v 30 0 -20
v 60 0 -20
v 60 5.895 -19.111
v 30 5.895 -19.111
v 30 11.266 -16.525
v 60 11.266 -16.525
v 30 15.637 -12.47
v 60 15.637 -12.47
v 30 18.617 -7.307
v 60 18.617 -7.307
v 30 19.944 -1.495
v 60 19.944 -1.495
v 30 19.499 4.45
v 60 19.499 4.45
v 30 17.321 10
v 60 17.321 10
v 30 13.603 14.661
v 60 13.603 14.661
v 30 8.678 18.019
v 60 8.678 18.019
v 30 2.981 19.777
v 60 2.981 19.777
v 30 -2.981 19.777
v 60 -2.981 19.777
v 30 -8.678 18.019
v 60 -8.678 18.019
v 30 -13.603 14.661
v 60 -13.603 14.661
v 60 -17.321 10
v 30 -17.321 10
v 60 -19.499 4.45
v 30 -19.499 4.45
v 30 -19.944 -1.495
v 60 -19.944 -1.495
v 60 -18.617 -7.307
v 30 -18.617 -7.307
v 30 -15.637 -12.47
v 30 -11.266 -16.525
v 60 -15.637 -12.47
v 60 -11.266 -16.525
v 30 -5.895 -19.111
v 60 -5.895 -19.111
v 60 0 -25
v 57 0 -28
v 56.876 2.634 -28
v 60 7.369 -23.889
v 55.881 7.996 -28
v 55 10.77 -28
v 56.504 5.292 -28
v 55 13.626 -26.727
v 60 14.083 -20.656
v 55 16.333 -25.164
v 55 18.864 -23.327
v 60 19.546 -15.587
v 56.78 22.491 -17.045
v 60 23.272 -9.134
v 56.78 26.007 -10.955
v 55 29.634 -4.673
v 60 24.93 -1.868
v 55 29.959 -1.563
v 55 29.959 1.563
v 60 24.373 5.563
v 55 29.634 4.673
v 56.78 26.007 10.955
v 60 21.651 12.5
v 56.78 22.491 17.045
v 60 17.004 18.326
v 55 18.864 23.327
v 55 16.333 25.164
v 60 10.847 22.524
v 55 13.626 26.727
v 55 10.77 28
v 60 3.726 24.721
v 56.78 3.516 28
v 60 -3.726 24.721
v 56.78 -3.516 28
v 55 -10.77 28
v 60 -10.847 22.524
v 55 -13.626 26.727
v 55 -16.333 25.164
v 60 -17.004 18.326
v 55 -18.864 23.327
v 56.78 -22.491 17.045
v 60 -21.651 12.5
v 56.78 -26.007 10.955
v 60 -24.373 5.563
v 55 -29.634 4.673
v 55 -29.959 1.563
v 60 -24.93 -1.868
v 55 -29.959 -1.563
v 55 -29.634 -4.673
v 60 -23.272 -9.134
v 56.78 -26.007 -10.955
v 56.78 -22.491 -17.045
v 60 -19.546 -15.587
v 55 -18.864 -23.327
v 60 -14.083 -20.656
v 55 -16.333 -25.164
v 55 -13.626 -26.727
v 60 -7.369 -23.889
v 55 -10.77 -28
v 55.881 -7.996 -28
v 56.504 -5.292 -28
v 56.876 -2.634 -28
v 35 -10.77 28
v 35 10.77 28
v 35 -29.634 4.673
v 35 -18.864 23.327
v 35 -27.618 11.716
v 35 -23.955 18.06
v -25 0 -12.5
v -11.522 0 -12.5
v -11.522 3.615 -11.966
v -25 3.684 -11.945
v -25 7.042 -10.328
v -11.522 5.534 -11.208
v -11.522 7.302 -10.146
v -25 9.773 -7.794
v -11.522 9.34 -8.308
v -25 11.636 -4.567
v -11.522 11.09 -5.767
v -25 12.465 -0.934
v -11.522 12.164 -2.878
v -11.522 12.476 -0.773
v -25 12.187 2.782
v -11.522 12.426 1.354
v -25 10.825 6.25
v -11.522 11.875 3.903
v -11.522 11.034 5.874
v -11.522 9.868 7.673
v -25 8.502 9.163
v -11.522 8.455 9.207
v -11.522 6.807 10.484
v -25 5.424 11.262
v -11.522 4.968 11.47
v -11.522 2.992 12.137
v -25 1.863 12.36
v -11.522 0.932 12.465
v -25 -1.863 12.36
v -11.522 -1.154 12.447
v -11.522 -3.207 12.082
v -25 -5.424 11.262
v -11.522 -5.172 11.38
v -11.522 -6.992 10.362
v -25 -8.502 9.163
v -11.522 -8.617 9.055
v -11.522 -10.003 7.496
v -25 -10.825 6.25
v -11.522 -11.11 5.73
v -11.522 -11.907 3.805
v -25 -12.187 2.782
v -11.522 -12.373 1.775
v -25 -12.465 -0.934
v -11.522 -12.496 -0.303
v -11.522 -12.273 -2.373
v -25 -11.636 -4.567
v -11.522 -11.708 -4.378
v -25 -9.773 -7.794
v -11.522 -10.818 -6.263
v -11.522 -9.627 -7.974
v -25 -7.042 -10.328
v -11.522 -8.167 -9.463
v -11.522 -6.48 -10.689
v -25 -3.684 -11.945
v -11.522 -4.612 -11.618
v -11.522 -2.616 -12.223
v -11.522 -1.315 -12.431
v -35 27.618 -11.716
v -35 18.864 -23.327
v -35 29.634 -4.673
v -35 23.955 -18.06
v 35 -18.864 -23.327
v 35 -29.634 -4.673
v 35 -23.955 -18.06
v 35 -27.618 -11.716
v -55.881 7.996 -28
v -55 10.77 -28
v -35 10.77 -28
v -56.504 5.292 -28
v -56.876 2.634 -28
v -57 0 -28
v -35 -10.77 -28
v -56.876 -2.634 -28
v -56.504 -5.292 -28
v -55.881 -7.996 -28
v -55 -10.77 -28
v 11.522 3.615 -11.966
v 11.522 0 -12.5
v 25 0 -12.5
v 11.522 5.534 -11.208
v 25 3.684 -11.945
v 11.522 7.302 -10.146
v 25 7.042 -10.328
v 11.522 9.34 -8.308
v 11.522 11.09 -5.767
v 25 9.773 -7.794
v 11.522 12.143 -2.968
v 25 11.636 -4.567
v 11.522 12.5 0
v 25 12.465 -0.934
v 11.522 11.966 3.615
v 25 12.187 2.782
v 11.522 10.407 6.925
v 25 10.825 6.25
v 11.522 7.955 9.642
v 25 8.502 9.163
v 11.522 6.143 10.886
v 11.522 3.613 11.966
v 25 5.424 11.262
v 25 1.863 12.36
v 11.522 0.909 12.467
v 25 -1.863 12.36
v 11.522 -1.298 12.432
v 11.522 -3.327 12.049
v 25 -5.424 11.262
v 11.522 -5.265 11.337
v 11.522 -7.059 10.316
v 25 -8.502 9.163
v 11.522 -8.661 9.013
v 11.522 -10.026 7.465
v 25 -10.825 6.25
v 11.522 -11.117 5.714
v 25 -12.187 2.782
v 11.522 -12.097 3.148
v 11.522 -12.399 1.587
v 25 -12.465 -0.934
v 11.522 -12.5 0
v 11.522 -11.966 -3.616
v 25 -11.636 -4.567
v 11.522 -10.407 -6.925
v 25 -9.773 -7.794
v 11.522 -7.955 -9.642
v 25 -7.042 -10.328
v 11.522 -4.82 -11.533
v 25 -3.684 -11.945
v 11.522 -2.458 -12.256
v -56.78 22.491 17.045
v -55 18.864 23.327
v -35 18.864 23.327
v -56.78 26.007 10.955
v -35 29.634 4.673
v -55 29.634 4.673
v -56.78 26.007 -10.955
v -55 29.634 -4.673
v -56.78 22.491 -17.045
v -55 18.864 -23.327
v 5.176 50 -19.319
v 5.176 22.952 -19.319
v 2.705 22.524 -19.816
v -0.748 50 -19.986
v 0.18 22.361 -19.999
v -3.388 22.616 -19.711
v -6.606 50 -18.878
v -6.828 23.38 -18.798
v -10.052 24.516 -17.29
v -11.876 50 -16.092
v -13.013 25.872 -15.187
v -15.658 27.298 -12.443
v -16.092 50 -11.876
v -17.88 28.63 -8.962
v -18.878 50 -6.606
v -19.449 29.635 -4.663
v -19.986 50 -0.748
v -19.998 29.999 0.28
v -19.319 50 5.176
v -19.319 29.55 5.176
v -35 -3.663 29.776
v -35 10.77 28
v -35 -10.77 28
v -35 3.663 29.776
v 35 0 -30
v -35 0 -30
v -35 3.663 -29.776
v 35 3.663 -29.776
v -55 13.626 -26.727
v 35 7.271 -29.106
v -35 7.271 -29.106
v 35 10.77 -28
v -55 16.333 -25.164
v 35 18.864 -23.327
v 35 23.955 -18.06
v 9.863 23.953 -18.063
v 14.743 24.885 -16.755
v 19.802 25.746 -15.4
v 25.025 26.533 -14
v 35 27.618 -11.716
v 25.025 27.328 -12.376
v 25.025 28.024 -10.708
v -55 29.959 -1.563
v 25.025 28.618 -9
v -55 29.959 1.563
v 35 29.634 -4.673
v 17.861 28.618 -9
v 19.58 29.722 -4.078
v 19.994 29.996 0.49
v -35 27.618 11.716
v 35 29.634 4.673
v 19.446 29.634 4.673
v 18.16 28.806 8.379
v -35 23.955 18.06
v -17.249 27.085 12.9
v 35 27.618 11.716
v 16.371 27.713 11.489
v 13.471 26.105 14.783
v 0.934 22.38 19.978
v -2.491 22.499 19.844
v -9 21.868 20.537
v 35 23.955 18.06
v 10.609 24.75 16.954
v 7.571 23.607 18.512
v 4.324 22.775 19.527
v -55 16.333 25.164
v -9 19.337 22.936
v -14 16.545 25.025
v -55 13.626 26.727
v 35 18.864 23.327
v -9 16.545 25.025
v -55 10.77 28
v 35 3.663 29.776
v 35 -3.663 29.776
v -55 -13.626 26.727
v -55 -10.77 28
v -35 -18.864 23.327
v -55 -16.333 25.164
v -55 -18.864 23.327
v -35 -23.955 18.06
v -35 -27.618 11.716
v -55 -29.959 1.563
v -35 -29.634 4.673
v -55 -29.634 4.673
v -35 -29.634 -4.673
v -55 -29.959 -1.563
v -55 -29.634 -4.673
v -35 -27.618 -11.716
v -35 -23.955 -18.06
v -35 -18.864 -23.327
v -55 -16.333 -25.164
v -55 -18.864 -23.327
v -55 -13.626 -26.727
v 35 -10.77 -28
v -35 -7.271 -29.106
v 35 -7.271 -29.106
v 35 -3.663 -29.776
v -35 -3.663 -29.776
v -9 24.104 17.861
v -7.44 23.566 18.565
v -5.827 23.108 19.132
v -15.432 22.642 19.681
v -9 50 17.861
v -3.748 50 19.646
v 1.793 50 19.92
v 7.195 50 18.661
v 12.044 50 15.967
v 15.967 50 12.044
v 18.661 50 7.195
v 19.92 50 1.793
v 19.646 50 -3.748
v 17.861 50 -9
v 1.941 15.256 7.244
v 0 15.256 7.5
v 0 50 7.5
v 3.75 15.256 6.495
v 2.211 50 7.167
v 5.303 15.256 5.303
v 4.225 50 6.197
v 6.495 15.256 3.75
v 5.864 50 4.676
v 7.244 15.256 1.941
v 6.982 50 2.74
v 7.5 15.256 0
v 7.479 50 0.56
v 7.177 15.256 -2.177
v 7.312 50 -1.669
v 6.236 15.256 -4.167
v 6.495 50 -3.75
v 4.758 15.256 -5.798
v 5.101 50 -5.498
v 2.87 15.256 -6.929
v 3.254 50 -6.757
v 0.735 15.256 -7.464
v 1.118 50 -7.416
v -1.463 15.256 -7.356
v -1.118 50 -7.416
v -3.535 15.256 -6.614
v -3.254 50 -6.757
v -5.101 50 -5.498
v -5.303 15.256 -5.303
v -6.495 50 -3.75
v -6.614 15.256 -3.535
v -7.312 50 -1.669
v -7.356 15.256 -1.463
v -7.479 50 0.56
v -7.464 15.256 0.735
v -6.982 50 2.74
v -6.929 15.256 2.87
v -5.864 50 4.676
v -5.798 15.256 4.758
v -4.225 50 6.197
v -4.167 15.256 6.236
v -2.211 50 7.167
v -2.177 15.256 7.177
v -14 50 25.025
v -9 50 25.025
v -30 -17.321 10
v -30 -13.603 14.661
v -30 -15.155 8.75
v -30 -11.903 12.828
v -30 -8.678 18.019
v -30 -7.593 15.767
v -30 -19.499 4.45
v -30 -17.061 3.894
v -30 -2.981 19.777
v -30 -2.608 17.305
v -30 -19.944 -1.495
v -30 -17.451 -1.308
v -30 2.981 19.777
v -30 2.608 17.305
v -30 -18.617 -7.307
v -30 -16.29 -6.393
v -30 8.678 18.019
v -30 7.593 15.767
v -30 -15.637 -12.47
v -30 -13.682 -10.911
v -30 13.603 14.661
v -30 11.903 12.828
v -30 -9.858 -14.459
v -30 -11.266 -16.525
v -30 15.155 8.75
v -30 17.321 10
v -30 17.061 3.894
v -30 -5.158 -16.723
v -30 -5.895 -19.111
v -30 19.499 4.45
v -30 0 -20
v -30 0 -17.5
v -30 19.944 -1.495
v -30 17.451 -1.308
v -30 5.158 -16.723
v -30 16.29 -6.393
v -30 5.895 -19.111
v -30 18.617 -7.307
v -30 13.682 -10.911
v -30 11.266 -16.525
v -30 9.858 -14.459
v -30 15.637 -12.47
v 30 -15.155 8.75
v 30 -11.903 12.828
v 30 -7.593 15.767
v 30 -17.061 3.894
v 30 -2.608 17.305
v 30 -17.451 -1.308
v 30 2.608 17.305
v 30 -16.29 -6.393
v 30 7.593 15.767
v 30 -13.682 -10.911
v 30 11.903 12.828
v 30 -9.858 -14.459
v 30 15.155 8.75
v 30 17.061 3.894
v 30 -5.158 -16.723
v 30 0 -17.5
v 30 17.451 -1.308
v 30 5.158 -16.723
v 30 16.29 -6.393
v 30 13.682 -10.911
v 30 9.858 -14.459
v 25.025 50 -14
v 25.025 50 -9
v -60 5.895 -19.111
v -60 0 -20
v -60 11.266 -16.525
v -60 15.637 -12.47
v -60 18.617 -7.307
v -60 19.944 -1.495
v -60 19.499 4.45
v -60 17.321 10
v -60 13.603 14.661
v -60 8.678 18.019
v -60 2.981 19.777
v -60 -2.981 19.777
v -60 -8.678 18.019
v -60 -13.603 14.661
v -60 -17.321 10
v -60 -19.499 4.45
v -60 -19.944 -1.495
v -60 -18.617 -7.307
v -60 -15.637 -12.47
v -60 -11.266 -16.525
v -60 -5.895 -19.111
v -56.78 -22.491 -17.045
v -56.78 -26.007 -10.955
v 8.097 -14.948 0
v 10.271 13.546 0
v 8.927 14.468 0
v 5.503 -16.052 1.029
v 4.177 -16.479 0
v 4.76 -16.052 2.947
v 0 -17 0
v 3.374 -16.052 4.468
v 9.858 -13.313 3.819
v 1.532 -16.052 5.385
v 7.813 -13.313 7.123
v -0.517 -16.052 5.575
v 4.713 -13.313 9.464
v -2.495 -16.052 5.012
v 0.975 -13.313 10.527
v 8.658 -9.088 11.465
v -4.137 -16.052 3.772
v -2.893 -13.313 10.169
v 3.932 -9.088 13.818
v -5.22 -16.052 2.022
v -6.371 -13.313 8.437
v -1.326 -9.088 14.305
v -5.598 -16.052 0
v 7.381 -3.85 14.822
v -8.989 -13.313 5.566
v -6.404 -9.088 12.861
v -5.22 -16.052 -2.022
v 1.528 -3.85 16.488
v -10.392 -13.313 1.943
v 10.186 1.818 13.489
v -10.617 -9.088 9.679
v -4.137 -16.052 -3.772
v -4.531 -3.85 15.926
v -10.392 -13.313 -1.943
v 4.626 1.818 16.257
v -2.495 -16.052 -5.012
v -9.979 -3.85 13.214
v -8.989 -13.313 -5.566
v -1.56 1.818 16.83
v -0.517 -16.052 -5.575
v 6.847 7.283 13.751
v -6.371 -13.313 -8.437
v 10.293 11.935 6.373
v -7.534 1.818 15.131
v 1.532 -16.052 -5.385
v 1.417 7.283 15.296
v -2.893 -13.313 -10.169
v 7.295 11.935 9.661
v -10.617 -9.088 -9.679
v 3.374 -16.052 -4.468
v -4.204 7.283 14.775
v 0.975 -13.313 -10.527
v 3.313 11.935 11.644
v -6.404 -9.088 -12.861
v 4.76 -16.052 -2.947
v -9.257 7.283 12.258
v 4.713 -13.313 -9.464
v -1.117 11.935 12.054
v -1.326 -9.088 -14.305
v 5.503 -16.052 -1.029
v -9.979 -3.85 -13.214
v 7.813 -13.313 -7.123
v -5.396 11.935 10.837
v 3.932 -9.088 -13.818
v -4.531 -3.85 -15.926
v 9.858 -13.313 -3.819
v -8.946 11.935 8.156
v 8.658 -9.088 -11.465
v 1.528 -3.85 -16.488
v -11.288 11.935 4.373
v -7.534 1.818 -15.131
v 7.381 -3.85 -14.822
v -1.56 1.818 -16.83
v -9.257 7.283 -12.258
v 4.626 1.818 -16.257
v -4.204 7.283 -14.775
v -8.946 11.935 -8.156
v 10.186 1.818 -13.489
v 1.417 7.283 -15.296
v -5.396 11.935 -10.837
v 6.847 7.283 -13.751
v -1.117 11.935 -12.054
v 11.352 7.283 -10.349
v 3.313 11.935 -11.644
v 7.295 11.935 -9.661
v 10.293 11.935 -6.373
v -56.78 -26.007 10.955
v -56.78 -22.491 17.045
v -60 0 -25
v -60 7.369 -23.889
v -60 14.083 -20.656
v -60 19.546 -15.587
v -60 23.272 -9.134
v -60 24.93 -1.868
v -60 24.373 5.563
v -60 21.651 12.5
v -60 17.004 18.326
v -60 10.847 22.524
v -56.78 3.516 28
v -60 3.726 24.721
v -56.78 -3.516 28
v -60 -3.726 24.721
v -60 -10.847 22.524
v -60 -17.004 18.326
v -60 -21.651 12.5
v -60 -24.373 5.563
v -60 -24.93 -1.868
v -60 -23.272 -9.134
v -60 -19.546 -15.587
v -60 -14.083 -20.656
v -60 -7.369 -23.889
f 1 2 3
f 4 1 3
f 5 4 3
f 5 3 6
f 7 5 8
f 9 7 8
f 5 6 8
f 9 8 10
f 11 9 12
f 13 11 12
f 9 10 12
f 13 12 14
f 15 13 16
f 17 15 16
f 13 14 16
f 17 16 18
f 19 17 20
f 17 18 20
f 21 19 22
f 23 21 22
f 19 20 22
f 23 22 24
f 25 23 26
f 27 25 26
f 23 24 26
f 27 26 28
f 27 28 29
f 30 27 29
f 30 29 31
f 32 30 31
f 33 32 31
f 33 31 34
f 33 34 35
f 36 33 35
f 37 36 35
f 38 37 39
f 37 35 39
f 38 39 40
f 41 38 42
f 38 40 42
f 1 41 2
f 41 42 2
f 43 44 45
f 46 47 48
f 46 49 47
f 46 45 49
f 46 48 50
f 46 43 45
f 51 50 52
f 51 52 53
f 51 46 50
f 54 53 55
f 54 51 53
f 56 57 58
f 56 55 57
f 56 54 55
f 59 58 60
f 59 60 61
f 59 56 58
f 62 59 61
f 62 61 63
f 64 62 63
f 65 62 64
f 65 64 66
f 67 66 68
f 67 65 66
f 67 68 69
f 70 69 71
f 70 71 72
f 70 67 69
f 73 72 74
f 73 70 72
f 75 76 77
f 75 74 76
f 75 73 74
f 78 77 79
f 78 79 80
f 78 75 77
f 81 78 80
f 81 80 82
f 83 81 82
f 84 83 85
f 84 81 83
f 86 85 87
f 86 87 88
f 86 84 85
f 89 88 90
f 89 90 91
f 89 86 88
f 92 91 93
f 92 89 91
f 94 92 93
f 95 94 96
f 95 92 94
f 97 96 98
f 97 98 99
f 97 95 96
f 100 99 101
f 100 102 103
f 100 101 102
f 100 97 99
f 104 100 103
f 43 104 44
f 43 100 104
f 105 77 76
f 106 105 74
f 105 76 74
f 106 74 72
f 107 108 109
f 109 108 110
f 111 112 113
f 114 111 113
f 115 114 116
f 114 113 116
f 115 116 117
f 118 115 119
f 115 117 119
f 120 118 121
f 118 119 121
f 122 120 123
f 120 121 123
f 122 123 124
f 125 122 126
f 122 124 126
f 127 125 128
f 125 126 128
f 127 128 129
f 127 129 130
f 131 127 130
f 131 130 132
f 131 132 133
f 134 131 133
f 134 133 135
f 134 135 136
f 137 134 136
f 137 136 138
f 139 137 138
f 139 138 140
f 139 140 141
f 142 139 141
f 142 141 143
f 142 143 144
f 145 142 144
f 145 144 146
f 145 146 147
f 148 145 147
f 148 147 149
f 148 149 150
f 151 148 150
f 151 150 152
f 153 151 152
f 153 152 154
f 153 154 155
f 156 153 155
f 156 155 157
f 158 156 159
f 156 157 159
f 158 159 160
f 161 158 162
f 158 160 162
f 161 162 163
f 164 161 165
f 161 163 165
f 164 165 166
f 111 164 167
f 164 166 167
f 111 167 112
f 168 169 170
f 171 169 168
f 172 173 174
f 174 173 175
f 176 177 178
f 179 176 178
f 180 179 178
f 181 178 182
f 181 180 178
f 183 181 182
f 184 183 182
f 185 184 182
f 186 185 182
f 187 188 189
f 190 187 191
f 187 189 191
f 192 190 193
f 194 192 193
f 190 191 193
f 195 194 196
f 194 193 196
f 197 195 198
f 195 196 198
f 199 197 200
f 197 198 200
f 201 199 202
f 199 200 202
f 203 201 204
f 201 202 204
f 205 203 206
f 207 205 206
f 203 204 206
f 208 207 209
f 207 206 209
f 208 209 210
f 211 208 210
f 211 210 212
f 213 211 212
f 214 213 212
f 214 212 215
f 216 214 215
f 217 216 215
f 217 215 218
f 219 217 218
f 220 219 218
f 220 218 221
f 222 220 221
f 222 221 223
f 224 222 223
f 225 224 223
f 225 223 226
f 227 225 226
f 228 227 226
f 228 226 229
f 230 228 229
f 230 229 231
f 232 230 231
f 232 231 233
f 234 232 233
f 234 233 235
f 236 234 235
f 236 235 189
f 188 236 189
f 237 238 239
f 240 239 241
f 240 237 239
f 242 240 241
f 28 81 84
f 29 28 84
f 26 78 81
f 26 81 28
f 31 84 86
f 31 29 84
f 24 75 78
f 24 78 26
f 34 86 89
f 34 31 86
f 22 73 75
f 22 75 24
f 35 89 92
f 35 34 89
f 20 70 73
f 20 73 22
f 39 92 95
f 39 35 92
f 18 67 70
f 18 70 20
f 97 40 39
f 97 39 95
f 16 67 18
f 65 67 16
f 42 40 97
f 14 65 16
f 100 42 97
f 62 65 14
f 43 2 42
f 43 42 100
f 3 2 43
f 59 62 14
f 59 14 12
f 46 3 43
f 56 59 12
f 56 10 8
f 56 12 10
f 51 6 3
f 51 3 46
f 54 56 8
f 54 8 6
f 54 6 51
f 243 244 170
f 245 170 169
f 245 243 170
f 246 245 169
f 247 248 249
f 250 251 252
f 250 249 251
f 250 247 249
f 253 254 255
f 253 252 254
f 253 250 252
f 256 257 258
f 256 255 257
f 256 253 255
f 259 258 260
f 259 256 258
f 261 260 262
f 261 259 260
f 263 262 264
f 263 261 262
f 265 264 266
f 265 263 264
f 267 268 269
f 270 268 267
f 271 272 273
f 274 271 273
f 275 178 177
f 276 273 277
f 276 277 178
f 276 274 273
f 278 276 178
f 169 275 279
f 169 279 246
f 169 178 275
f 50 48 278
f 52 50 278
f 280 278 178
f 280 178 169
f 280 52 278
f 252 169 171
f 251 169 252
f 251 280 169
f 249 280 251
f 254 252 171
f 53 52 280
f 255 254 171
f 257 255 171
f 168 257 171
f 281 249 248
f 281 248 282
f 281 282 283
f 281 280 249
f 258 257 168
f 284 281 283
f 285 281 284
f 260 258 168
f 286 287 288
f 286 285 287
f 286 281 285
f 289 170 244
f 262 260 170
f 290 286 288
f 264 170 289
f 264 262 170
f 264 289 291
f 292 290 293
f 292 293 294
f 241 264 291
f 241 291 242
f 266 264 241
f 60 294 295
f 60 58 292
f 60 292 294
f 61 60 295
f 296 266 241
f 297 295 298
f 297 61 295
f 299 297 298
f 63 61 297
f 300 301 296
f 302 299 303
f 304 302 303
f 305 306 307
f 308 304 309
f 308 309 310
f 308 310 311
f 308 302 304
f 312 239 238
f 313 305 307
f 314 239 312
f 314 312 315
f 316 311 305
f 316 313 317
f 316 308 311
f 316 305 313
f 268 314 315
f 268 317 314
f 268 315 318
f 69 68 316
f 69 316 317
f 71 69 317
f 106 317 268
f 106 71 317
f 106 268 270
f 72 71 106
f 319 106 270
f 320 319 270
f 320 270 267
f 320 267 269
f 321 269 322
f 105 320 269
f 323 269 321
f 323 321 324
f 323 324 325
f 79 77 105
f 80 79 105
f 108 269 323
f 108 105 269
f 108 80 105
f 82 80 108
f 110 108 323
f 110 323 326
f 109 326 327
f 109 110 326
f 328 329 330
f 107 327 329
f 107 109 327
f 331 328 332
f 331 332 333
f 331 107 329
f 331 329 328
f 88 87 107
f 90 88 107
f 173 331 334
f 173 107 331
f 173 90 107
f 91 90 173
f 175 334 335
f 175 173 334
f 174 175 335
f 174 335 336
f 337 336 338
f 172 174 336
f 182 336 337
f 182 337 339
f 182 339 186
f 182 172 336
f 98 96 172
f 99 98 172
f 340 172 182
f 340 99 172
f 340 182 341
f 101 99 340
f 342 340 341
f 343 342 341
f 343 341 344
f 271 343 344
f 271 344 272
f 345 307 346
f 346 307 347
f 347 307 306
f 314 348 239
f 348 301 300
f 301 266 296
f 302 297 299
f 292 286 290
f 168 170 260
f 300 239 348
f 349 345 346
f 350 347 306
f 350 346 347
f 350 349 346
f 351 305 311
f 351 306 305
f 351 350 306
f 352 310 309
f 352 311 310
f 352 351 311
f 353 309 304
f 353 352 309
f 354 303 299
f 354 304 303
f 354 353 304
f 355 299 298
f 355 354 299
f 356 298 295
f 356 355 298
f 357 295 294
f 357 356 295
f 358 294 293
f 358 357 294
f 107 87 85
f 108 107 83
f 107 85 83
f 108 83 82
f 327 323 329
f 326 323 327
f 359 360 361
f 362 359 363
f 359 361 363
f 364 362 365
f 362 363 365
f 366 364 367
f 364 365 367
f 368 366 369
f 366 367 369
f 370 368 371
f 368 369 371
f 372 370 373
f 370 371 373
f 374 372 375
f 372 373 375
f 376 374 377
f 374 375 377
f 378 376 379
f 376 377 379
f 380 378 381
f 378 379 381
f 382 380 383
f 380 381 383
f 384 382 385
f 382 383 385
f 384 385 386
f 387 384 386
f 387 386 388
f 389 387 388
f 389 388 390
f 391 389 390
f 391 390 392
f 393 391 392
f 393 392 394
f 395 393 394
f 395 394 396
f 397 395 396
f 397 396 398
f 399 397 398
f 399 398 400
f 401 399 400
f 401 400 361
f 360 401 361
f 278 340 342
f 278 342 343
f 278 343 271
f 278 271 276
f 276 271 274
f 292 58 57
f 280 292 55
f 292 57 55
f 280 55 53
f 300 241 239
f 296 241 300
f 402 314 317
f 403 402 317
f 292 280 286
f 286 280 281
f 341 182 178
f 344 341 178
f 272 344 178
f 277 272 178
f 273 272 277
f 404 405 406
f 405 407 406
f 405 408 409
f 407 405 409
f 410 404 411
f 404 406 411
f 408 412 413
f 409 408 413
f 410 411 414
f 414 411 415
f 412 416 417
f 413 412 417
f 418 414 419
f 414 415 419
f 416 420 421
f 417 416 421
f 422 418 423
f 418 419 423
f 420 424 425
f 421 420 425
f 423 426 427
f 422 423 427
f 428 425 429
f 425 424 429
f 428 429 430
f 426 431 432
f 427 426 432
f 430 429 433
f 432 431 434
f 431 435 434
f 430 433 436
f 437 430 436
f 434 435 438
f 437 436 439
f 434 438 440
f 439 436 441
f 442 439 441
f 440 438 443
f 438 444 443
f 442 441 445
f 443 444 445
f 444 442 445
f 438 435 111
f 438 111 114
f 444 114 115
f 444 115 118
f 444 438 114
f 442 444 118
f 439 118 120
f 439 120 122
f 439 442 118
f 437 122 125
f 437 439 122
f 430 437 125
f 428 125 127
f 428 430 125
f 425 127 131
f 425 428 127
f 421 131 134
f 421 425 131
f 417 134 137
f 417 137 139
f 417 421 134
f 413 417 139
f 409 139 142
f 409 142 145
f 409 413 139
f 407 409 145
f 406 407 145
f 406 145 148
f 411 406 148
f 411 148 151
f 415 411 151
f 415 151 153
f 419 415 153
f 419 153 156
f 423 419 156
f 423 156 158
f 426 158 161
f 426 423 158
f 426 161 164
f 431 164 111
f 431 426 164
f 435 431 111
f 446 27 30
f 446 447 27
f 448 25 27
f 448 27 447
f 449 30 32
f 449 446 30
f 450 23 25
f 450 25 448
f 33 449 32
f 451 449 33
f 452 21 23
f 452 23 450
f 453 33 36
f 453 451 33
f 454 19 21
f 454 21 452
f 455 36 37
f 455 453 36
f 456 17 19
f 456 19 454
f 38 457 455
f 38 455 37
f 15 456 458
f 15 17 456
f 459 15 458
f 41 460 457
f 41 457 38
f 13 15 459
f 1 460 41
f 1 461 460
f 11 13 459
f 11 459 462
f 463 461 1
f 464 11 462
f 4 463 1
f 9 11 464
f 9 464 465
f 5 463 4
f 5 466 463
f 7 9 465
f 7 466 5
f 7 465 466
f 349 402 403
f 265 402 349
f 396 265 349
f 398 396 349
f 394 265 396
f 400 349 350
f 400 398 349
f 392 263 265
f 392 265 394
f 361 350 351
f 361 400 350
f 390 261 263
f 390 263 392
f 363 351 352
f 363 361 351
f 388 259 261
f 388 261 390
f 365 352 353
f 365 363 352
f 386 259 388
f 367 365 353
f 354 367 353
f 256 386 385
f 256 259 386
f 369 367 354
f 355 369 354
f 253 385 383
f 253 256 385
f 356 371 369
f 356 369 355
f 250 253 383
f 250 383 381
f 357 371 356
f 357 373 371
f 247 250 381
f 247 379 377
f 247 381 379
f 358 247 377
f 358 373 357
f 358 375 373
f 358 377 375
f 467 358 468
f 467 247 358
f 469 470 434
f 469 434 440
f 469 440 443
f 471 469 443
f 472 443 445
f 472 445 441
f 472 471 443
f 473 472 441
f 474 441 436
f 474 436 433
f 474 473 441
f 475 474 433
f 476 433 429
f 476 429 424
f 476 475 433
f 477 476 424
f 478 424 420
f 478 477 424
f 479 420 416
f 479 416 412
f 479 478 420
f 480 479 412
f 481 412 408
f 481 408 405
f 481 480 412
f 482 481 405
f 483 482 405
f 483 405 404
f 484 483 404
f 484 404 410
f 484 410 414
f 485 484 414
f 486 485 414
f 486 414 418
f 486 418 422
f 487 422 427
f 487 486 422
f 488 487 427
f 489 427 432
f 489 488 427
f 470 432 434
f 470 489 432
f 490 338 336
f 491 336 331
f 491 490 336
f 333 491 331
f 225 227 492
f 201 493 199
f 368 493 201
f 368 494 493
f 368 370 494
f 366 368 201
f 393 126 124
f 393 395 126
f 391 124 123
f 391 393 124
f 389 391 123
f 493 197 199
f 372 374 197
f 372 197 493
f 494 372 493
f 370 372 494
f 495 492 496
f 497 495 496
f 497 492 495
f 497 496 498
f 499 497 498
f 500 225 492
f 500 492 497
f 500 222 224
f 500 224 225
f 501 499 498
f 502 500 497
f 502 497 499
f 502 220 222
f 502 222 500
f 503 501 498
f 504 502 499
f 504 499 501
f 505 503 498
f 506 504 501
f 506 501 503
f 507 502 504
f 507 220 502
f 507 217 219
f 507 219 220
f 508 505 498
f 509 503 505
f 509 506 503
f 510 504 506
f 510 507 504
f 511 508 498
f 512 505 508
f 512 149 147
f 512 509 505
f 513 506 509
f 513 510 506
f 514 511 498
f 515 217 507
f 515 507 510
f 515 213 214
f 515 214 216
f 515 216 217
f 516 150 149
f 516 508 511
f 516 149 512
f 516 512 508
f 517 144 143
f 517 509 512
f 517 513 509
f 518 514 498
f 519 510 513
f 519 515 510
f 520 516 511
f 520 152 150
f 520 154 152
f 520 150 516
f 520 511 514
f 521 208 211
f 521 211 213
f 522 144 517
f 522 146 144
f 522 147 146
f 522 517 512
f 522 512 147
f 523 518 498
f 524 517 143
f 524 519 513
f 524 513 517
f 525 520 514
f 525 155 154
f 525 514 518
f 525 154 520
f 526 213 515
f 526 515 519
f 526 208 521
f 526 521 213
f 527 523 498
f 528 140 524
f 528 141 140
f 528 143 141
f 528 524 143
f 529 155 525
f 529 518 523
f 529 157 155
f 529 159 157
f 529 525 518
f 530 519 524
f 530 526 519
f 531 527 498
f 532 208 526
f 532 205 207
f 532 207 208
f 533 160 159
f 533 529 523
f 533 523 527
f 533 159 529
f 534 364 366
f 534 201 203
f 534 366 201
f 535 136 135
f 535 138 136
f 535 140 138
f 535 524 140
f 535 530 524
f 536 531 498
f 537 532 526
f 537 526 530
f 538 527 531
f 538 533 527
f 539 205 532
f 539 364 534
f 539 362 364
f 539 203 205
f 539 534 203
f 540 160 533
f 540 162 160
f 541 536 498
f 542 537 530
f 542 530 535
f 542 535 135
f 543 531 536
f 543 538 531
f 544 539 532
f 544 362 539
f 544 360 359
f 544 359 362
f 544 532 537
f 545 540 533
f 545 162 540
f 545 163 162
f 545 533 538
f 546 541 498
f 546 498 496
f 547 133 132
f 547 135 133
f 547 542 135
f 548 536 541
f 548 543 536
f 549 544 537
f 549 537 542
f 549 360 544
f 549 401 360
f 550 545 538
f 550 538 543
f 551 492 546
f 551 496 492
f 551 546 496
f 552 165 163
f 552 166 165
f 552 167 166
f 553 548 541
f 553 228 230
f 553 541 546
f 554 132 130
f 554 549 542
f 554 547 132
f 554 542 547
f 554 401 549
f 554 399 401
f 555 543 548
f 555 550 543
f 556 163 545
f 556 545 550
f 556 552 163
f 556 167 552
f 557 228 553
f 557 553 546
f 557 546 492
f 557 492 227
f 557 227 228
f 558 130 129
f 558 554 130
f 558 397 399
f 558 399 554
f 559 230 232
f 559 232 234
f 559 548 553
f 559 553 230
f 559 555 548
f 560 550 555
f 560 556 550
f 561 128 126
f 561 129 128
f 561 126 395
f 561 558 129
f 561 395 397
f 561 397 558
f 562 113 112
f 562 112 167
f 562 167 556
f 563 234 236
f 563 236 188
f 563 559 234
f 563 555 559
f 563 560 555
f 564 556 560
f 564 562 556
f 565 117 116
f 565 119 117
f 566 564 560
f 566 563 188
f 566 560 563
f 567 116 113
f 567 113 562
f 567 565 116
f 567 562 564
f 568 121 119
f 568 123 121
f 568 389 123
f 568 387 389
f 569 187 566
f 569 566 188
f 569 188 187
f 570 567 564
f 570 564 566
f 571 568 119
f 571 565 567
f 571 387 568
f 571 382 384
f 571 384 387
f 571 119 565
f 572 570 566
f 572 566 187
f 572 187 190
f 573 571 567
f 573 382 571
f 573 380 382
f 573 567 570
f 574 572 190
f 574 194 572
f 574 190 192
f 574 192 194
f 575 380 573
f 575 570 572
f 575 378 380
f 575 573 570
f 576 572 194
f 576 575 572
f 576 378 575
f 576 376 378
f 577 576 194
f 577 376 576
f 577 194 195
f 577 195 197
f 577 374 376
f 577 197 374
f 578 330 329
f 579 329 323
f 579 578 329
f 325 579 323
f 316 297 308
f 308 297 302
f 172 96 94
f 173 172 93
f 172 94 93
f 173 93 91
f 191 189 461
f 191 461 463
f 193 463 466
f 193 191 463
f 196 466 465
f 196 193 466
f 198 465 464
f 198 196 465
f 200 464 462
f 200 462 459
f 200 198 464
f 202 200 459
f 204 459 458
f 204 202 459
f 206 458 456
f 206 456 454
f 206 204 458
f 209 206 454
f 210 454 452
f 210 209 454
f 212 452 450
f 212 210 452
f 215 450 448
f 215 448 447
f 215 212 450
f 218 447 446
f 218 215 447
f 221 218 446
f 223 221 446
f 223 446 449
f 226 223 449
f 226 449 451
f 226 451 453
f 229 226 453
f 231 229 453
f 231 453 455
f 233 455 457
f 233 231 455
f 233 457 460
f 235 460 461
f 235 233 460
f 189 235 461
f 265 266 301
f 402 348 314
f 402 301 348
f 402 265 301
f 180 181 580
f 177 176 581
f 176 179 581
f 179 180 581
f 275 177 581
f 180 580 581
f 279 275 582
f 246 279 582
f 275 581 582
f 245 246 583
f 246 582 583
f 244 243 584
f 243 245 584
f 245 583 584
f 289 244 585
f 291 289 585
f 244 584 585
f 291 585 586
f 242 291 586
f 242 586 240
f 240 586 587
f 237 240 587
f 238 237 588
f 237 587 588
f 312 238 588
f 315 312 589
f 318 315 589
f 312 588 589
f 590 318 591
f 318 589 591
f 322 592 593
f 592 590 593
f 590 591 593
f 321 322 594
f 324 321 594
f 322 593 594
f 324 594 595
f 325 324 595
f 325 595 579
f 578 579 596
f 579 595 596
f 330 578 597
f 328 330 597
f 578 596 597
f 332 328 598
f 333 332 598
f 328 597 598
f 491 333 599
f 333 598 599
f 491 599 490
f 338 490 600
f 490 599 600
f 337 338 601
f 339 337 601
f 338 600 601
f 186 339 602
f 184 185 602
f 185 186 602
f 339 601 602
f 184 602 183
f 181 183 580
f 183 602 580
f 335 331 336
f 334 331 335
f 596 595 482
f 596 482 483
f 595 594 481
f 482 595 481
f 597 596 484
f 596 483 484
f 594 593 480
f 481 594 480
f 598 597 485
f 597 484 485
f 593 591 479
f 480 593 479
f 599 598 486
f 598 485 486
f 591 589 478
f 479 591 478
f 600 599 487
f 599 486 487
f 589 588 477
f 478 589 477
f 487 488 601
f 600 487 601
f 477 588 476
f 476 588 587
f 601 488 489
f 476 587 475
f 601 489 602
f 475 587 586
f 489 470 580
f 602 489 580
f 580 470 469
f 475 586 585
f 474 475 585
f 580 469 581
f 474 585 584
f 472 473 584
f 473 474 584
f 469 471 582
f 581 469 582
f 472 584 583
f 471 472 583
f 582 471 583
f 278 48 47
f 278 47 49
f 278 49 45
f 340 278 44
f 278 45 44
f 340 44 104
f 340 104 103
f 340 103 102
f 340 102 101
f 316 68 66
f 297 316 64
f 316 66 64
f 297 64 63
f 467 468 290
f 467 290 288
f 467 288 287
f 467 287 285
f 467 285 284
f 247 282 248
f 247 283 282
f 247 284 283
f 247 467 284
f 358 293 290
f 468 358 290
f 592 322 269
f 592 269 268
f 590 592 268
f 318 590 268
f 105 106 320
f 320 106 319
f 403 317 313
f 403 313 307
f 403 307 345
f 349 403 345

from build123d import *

# Parameters (mm, degrees)
SKETCH1_R                = 30
BOSS_EXTRUDE1_DEPTH      = 60
CHAMFER1_SIZE            = 5
CUT_EXTRUDE1_DEPTH       = 25
CIRPATTERN1_COUNT        = 6
SKETCH3_R                = 20
CUT_EXTRUDE2_DEPTH       = 30
SKETCH5_R                = 12.5
CUT_EXTRUDE3_DEPTH       = 91
CHAMFER2_SIZE            = 5
MIRROR1_COPY_1_DEPTH     = 25
MIRROR1_COPY_2_DEPTH     = 25
MIRROR1_COPY_3_DEPTH     = 25
MIRROR1_COPY_4_DEPTH     = 25
MIRROR1_COPY_5_DEPTH     = 25
CHAMFER2_OF_MIRROR1_SIZE = 5
BOSS_EXTRUDE2_REACH      = 82
BOSS_EXTRUDE2_END_RADIUS = 30
CUT_EXTRUDE4_REACH       = 82
CUT_EXTRUDE4_END_RADIUS  = 17
SKETCH8_R                = 7.5


with BuildPart() as part:
    # Sketch1 → Boss-Extrude1 (new body, symmetric)
    with BuildSketch(Plane(origin=(0, 0, 0), x_dir=(0, 0, -1), z_dir=(1, 0, 0))):
        Circle(SKETCH1_R)
    extrude(amount=BOSS_EXTRUDE1_DEPTH, both=True)

    # Chamfer1
    chamfer1_edges = [part.edges().sort_by_distance(p)[0] for p in [
        (-60, 0, 30),
        (60, 0, 30),
    ]]
    chamfer(chamfer1_edges, length=CHAMFER1_SIZE)

    # Sketch2 → Cut-Extrude1 (cut)
    with BuildSketch(Plane(origin=(60, 0, 0), x_dir=(0, 0, -1), z_dir=(1, 0, 0))):
        with BuildLine():
            Line((28, 10.770329614), (28, -10.770329614))
            ThreePointArc((28, -10.770329614), (30, 0), (28, 10.770329614))
        make_face()
    cut_extrude1 = extrude(amount=-CUT_EXTRUDE1_DEPTH, mode=Mode.SUBTRACT)

    # CirPattern1: Cut-Extrude1 ×6 about axis
    cirpattern1_axis = Axis((0, 0, 0), (1, 0, 0))
    for i in range(1, CIRPATTERN1_COUNT):
        add(cut_extrude1.rotate(cirpattern1_axis, i * 360 / CIRPATTERN1_COUNT), mode=Mode.SUBTRACT)

    # Sketch3 → Cut-Extrude2 (cut)
    with BuildSketch(Plane(origin=(60, 0, 0), x_dir=(0, 0, -1), z_dir=(1, 0, 0))):
        Circle(SKETCH3_R)
    cut_extrude2 = extrude(amount=-CUT_EXTRUDE2_DEPTH, mode=Mode.SUBTRACT)

    # Sketch5 → Cut-Extrude3 (cut, through all)
    with BuildSketch(Plane(origin=(30, 0, 0), x_dir=(0, 0, -1), z_dir=(1, 0, 0))):
        Circle(SKETCH5_R)
    extrude(amount=-CUT_EXTRUDE3_DEPTH, mode=Mode.SUBTRACT)

    # Sketch4 → Cut-Revolve1 (revolve, cut)
    with BuildSketch(Plane.XY):
        with BuildLine():
            Line((0, 17), (0, -17))
            ThreePointArc((0, -17), (17, 0), (0, 17))
        make_face()
    revolve(axis=Axis((0, 40.549893096, 0), (0, -1, 0)), mode=Mode.SUBTRACT)

    # Chamfer2
    chamfer2_edges = [part.edges().sort_by_distance(p)[0] for p in [
        (30, 0, 12.5),
    ]]
    chamfer(chamfer2_edges, length=CHAMFER2_SIZE)

    # Mirror1: Cut-Extrude1, Cut-Extrude2 across plane
    add(cut_extrude1.mirror(Plane(origin=(0, 0, 0), x_dir=(0, 0, 1), z_dir=(1, 0, 0))), mode=Mode.SUBTRACT)
    add(cut_extrude2.mirror(Plane(origin=(0, 0, 0), x_dir=(0, 0, 1), z_dir=(1, 0, 0))), mode=Mode.SUBTRACT)

    # Mirror1 copy 1 sketch → Mirror1 copy 1 (cut)
    with BuildSketch(Plane(origin=(-60, 0, 0), x_dir=(0, 0.866025404, -0.5), z_dir=(-1, 0, 0))):
        with BuildLine():
            Line((28, -10.770329614), (28, 10.770329614))
            ThreePointArc((28, 10.770329614), (30, 0), (28, -10.770329614))
        make_face()
    extrude(amount=-MIRROR1_COPY_1_DEPTH, mode=Mode.SUBTRACT)

    # Mirror1 copy 2 sketch → Mirror1 copy 2 (cut)
    with BuildSketch(Plane(origin=(-60, 0, 0), x_dir=(0, 0.866025404, 0.5), z_dir=(-1, 0, 0))):
        with BuildLine():
            Line((28, -10.770329614), (28, 10.770329614))
            ThreePointArc((28, 10.770329614), (30, 0), (28, -10.770329614))
        make_face()
    extrude(amount=-MIRROR1_COPY_2_DEPTH, mode=Mode.SUBTRACT)

    # Mirror1 copy 3 sketch → Mirror1 copy 3 (cut)
    with BuildSketch(Plane.ZY.offset(60)):
        with BuildLine():
            Line((28, -10.770329614), (28, 10.770329614))
            ThreePointArc((28, 10.770329614), (30, 0), (28, -10.770329614))
        make_face()
    extrude(amount=-MIRROR1_COPY_3_DEPTH, mode=Mode.SUBTRACT)

    # Mirror1 copy 4 sketch → Mirror1 copy 4 (cut)
    with BuildSketch(Plane(origin=(-60, 0, 0), x_dir=(0, -0.866025404, 0.5), z_dir=(-1, 0, 0))):
        with BuildLine():
            Line((28, -10.770329614), (28, 10.770329614))
            ThreePointArc((28, 10.770329614), (30, 0), (28, -10.770329614))
        make_face()
    extrude(amount=-MIRROR1_COPY_4_DEPTH, mode=Mode.SUBTRACT)

    # Mirror1 copy 5 sketch → Mirror1 copy 5 (cut)
    with BuildSketch(Plane(origin=(-60, 0, 0), x_dir=(0, -0.866025404, -0.5), z_dir=(-1, 0, 0))):
        with BuildLine():
            Line((28, -10.770329614), (28, 10.770329614))
            ThreePointArc((28, 10.770329614), (30, 0), (28, -10.770329614))
        make_face()
    extrude(amount=-MIRROR1_COPY_5_DEPTH, mode=Mode.SUBTRACT)

    # Chamfer2 of Mirror1
    chamfer2_of_mirror1_edges = [part.edges().sort_by_distance(p)[0] for p in [
        (-30, 0, 12.5),
    ]]
    chamfer(chamfer2_of_mirror1_edges, length=CHAMFER2_OF_MIRROR1_SIZE)

    # Boss-Extrude2: up to this cylinder (the profile starts outside it)
    boss_extrude2_end = Plane(origin=(0.286485, 0, 0), z_dir=(-1, 0, 0)) * Cylinder(BOSS_EXTRUDE2_END_RADIUS, 225, mode=Mode.PRIVATE)
    # Sketch6 → Boss-Extrude2 (add, up to the surface)
    with BuildSketch(Plane(origin=(0, 50, 0), x_dir=(1, 0, 0), z_dir=(0, 1, 0)), mode=Mode.PRIVATE) as boss_extrude2_sk1:
        with BuildLine():
            Line((17.860571099, 9), (25.025354797, 9))
            Line((25.025354797, 9), (25.025354797, 14))
            Line((25.025354797, 14), (5.176380902, 19.318516526))
            ThreePointArc((5.176380902, 19.318516526), (-14.142135624, 14.142135624), (-19.318516526, -5.176380902))
            Line((-19.318516526, -5.176380902), (-14, -25.025354797))
            Line((-14, -25.025354797), (-9, -25.025354797))
            Line((-9, -25.025354797), (-9, -17.860571099))
            ThreePointArc((-9, -17.860571099), (14.142135624, -14.142135624), (17.860571099, 9))
        make_face()
    boss_extrude2_tool1 = extrude(boss_extrude2_sk1.sketch, amount=-BOSS_EXTRUDE2_REACH, mode=Mode.PRIVATE) - boss_extrude2_end
    add(boss_extrude2_tool1.solids().sort_by_distance((0.286485, 50, 0.286485))[0])

    # Cut-Extrude4: up to this sphere (the profile starts outside it)
    cut_extrude4_end = Location((0, 0, 0)) * Sphere(CUT_EXTRUDE4_END_RADIUS, mode=Mode.PRIVATE)
    # Sketch8 → Cut-Extrude4 (cut, up to the surface)
    with BuildSketch(Plane(origin=(0, 50, 0), x_dir=(1, 0, 0), z_dir=(0, 1, 0)), mode=Mode.PRIVATE) as cut_extrude4_sk1:
        with Locations(Location((0, 0, 0), (0, 0, 270))):  # turned: the seam where the file's is
            Circle(SKETCH8_R)
    cut_extrude4_tool1 = extrude(cut_extrude4_sk1.sketch, amount=-CUT_EXTRUDE4_REACH, mode=Mode.PRIVATE) - cut_extrude4_end
    add(cut_extrude4_tool1.solids().sort_by_distance((0, 50, 0))[0], mode=Mode.SUBTRACT)


solid = part.part
